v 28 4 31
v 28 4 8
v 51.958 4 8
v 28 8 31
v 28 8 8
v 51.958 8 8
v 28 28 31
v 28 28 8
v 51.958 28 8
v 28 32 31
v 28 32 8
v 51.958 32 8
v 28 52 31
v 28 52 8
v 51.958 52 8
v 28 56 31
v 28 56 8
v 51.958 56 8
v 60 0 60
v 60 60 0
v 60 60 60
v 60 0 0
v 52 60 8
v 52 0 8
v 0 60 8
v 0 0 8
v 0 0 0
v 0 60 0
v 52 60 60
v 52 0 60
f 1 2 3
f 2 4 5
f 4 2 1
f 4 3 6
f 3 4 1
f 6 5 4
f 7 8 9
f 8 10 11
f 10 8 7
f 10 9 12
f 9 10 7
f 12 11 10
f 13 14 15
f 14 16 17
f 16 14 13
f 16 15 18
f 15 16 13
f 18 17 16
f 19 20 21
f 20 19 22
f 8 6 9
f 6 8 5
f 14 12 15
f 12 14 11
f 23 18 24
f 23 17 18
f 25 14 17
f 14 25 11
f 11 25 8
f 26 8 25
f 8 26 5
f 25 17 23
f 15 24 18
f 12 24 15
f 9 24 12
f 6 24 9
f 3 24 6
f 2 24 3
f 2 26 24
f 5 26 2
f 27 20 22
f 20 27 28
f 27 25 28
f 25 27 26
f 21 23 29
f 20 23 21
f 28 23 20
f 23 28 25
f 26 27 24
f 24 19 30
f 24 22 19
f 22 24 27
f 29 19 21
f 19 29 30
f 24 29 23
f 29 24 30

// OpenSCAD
$fn = 32;

// ----------------------------------------------------------------------
// Rib bracket: 3-gusset L bracket
// ----------------------------------------------------------------------

// --- parameters (mm) ---
base_l = 60;              // foot length, X
base_w = 60;              // foot width, Y
base_t = 8;               // foot thickness
plate_t = 8;              // upright plate thickness
plate_h = 60;             // overall height
gus_l = 24;               // gusset leg along the foot
gus_h = 24;               // gusset height
gus_t = 4;                // gusset thickness
gus_edge = 4;             // gusset margin from the foot edge
n_gus = 3;                // gusset count

gus_pitch = (base_w - 2 * gus_edge - gus_t) / (n_gus - 1);  // gusset pitch

union() {
  cube([base_l, base_w, base_t]);
  translate([base_l - plate_t, 0, base_t - 1])
    cube([plate_t, base_w, plate_h - base_t + 1]);
  for (i = [0 : n_gus - 1])
    translate([base_l - plate_t - gus_l, gus_edge + i * gus_pitch, base_t - 1])
      rotate([-90, 0, 0])
        linear_extrude(height = gus_t)
          polygon(points = [[0, 0], [gus_l + 1, 0], [0, -gus_h]]);
}
